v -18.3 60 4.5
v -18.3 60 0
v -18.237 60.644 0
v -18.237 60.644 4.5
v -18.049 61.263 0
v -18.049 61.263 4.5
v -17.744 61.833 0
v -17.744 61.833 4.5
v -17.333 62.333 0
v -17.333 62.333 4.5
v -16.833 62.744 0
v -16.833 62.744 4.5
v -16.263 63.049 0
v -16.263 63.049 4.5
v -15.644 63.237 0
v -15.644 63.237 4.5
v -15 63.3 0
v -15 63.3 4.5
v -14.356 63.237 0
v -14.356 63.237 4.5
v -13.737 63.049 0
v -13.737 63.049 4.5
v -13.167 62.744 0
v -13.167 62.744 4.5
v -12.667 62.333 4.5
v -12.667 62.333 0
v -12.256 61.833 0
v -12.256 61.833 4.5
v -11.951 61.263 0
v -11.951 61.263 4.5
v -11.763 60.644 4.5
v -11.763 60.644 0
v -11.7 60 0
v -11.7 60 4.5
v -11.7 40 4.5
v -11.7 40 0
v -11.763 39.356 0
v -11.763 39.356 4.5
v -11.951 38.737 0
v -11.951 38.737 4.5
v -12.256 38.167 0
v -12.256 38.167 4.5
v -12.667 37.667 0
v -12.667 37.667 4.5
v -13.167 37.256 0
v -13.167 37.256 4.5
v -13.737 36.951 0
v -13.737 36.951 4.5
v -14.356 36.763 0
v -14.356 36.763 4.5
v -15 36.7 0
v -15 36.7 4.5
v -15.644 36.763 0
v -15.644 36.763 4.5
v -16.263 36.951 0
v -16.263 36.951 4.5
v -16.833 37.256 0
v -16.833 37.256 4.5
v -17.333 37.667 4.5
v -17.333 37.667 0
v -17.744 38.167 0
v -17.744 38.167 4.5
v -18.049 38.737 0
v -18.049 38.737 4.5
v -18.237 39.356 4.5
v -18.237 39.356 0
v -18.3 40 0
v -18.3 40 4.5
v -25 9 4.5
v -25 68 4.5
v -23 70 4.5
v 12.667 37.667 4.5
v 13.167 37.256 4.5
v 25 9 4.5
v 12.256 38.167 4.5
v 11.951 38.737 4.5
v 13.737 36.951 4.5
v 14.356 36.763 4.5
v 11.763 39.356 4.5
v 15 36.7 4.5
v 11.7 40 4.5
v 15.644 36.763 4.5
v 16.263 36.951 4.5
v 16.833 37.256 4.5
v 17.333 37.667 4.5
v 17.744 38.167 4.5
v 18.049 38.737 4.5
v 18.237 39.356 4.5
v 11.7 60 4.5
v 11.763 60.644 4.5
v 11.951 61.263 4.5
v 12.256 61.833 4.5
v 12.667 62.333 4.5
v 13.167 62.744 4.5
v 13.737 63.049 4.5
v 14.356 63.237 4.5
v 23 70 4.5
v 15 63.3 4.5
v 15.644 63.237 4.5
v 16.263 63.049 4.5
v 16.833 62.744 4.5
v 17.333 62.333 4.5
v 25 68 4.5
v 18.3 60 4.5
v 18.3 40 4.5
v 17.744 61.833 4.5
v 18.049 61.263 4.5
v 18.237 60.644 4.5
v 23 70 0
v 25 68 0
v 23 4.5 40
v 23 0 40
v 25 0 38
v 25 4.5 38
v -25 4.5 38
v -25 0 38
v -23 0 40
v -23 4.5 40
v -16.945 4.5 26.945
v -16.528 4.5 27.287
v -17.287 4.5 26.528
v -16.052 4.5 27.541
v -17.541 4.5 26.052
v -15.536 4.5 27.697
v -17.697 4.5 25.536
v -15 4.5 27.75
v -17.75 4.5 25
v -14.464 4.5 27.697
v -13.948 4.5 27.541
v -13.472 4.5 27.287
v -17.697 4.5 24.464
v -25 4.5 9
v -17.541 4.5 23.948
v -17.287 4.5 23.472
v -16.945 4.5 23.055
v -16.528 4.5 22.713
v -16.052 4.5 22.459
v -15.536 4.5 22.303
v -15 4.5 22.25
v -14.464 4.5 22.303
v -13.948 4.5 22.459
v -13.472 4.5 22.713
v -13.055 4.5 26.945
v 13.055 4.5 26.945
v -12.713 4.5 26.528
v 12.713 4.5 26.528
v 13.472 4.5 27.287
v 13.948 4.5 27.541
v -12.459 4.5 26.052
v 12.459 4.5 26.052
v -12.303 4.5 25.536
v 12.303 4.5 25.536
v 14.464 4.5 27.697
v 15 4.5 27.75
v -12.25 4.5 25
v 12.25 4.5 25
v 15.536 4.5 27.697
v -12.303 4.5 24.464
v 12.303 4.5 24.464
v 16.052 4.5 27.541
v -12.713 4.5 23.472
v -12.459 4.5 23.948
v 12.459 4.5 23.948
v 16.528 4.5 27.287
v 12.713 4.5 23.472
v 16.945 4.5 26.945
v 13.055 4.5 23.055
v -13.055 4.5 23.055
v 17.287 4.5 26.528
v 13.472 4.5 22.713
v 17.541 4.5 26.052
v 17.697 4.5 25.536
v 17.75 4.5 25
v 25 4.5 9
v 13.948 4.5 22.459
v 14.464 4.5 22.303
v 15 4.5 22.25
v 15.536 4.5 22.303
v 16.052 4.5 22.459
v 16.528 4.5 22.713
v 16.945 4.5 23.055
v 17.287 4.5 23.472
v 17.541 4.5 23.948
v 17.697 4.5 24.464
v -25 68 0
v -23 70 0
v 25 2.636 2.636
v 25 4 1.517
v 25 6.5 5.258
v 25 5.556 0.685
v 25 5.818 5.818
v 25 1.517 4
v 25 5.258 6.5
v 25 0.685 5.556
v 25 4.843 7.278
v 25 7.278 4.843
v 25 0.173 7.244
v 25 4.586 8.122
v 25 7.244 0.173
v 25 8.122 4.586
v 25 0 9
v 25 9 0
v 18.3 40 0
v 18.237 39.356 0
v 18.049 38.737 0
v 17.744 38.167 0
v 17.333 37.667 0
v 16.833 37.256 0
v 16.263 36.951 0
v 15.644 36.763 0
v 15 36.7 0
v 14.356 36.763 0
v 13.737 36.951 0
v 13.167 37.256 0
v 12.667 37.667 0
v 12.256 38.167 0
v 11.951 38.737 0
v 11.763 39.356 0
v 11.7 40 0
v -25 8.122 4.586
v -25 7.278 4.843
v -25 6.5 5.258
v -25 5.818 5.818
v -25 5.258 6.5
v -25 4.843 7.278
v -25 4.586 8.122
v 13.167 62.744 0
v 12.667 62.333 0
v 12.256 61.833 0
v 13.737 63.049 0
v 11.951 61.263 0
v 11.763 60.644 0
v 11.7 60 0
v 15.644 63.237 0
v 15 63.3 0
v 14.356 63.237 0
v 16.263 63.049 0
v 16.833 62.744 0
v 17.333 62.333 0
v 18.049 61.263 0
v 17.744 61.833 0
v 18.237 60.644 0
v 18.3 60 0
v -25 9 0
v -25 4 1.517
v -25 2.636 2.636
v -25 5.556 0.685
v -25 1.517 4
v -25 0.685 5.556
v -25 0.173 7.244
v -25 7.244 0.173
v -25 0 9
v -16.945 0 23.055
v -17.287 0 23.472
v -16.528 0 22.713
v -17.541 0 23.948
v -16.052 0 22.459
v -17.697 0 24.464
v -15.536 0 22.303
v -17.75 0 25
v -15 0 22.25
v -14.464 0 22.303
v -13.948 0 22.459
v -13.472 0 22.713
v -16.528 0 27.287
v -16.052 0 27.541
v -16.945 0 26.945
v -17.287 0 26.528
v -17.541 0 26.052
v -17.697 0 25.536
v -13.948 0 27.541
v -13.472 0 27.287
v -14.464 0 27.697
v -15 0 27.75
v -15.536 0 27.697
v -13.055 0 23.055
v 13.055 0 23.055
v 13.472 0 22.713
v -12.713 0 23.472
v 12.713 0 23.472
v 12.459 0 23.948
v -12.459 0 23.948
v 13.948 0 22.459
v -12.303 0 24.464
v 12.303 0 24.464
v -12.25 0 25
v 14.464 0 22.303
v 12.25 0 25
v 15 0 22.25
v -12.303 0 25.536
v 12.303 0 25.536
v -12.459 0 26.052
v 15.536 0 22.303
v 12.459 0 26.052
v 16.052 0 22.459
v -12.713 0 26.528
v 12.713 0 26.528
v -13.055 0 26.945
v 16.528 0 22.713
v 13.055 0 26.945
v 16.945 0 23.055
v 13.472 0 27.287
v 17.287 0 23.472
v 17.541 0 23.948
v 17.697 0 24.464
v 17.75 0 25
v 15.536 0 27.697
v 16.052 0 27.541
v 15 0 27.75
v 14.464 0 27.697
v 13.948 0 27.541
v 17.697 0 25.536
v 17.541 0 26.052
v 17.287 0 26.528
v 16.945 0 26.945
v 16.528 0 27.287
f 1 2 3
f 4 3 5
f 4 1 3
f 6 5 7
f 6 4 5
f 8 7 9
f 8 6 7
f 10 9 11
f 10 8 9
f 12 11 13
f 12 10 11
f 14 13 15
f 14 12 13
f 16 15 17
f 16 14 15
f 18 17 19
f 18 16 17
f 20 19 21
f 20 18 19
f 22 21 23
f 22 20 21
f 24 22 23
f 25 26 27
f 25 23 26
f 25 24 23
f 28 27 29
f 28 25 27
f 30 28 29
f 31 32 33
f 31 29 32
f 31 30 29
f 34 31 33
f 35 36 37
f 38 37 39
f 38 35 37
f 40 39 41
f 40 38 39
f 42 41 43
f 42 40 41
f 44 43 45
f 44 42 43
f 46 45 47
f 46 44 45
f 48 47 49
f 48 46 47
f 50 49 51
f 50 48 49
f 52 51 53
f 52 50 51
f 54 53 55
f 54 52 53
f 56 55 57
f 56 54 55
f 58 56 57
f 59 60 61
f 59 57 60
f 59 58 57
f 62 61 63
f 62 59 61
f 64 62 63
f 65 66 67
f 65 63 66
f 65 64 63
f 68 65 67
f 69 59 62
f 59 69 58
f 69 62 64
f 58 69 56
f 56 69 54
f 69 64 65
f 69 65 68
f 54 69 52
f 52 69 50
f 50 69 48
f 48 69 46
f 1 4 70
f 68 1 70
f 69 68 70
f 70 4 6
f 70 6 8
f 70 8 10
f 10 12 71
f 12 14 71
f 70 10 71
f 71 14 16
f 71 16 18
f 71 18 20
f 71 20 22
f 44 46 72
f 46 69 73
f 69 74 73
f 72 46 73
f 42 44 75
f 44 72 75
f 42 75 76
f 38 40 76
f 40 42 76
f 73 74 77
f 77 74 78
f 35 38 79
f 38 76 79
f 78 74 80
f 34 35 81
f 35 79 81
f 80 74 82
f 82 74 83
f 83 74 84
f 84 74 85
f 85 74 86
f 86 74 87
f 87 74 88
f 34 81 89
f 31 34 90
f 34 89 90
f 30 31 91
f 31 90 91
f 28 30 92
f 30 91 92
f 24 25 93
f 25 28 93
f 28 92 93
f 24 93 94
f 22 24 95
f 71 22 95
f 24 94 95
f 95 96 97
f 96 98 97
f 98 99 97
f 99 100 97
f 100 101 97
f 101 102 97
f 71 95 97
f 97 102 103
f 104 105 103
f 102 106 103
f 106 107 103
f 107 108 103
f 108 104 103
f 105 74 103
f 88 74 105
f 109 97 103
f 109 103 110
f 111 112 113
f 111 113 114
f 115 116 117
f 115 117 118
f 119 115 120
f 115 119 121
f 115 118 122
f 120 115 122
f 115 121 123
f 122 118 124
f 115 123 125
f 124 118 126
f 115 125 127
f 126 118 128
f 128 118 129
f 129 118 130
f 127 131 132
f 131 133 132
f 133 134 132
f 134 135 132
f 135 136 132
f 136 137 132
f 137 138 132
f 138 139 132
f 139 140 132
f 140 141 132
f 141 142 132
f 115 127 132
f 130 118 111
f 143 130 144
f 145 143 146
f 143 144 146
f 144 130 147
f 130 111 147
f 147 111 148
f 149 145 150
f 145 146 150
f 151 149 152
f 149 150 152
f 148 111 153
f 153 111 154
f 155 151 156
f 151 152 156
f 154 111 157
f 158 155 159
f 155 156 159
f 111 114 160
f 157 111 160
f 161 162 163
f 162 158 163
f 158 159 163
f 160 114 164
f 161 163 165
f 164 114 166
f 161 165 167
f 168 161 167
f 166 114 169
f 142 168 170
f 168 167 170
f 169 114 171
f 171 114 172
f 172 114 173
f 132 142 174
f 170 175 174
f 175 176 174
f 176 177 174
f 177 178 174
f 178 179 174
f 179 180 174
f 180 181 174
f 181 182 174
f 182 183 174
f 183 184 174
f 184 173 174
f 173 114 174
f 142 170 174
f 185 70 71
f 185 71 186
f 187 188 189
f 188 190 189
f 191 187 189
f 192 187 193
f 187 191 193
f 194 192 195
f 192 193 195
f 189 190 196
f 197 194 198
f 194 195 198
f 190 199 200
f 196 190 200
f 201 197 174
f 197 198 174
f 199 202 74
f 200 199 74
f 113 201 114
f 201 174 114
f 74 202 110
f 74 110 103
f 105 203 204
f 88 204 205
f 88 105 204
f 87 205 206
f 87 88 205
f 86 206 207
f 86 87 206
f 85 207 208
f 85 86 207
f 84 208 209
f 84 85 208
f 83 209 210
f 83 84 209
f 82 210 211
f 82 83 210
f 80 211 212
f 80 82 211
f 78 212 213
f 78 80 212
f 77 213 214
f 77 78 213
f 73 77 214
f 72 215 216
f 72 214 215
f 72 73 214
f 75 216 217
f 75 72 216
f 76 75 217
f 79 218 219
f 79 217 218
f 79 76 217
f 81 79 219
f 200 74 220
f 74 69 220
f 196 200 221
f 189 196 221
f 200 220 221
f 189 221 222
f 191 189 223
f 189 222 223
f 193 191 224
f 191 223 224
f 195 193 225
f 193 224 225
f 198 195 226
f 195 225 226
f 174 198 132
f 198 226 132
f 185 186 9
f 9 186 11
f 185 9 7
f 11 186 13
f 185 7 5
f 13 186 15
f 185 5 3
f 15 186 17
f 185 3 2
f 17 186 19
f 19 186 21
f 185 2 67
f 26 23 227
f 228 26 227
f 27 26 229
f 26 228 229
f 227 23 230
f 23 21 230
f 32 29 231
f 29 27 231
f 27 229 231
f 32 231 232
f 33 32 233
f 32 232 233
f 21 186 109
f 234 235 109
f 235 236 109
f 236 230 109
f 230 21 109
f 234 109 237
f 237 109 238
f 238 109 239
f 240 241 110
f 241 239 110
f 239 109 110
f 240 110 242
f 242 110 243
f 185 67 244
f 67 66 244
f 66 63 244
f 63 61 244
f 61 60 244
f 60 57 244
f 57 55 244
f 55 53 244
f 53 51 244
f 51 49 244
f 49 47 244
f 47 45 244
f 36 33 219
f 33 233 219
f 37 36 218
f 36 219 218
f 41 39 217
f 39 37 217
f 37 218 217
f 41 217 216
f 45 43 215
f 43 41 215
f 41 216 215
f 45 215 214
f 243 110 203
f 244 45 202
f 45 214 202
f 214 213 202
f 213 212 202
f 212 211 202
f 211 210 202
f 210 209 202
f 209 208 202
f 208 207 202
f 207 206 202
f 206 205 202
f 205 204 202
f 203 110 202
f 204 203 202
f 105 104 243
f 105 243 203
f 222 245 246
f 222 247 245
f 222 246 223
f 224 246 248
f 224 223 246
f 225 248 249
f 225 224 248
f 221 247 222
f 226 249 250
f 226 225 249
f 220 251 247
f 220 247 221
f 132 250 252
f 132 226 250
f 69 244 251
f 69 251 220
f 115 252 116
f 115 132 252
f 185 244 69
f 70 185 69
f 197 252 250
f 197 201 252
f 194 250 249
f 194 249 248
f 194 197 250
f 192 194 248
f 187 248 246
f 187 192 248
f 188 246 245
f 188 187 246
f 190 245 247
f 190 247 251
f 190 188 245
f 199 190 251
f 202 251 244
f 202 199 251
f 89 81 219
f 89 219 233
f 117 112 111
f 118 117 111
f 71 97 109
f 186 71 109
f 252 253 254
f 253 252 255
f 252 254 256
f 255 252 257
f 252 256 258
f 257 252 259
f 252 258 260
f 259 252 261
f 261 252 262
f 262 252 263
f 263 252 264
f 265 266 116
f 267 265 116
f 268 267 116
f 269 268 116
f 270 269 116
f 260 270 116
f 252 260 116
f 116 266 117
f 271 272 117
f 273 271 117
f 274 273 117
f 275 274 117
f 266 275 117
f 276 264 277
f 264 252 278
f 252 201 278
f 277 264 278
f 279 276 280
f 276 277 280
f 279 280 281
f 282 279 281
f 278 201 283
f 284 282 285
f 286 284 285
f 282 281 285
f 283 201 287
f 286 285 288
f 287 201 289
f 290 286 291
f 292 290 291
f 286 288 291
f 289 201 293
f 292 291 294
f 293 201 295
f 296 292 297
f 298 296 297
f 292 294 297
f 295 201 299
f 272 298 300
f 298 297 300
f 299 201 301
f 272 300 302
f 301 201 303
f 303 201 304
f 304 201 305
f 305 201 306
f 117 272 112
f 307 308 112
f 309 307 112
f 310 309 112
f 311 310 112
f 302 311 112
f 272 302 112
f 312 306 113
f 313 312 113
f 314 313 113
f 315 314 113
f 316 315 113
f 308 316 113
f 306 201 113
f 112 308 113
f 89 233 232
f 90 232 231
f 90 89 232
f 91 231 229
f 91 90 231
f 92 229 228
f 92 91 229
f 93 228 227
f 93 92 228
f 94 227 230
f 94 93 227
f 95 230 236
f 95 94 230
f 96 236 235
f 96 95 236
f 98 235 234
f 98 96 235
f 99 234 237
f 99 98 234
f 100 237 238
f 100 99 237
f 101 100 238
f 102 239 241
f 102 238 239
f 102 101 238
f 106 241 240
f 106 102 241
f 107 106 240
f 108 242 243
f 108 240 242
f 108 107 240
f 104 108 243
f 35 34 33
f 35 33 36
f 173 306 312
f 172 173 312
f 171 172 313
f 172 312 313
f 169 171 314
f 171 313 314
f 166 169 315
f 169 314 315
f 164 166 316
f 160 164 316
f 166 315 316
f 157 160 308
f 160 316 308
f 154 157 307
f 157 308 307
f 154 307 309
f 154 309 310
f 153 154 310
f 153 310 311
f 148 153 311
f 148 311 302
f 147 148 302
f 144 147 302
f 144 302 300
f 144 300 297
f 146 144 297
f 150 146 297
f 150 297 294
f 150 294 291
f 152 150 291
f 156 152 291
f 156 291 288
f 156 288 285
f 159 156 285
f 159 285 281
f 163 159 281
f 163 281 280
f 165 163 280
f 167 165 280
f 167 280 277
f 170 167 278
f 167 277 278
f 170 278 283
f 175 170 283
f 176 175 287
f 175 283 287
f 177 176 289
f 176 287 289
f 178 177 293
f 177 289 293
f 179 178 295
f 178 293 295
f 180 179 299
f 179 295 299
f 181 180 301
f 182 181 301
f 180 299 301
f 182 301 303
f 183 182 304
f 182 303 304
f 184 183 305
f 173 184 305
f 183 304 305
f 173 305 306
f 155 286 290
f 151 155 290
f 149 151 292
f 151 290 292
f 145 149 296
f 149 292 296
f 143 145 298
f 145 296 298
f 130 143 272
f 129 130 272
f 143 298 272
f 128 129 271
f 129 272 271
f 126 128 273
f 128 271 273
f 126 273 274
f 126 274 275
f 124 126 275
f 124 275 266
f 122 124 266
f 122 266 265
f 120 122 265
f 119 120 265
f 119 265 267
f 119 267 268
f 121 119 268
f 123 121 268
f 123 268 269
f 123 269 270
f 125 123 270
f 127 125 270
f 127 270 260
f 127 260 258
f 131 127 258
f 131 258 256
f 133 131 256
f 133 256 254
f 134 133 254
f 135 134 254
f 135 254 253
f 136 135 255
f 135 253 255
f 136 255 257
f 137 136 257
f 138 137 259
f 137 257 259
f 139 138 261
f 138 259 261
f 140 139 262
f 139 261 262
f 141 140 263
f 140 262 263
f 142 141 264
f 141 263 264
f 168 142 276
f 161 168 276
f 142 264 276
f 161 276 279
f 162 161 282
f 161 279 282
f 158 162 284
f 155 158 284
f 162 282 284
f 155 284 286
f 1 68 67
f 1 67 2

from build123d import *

# Parameters (mm, degrees)
BOSS_EXTRUDE1_DEPTH  = 25
FILLET1_R            = 4.5
FILLET2_R            = 9
M5_CLEARANCE_HOLE1_D = 5.5
CUT_EXTRUDE1_DEPTH   = 5.5
CHAMFER1_SIZE        = 2


with BuildPart() as part:
    # Sketch1 → Boss-Extrude1 (new body, symmetric)
    with BuildSketch(Plane(origin=(0, 0, 0), x_dir=(0, 0, -1), z_dir=(1, 0, 0))):
        Polygon((0, 0), (-40, 0), (-40, 4.5), (-4.5, 4.5), (-4.5, 70), (0, 70), align=None)
    extrude(amount=BOSS_EXTRUDE1_DEPTH, both=True)

    # Fillet1
    fillet1_edges = [part.edges().sort_by_distance(p)[0] for p in [
        (0, 4.5, 4.5),
    ]]
    fillet(fillet1_edges, radius=FILLET1_R)

    # Fillet2
    fillet2_edges = [part.edges().sort_by_distance(p)[0] for p in [
        (0, 0, 0),
    ]]
    fillet(fillet2_edges, radius=FILLET2_R)

    # M5 Clearance Hole1 (through all)
    with Locations(Plane(origin=(0, 4.5, 0), x_dir=(-1, 0, 0), z_dir=(0, 1, 0))):
        with Locations((15, 25), (-15, 25)):
            Hole(M5_CLEARANCE_HOLE1_D / 2)

    # Sketch4 → Cut-Extrude1 (cut, through all)
    with BuildSketch(Plane.XY.offset(4.5)):
        with BuildLine():
            Line((-11.7, 60), (-11.7, 40))
            ThreePointArc((-11.7, 40), (-15, 36.7), (-18.3, 40))
            Line((-18.3, 40), (-18.3, 60))
            ThreePointArc((-18.3, 60), (-15, 63.3), (-11.7, 60))
        make_face()
        with BuildLine():
            Line((18.3, 60), (18.3, 40))
            ThreePointArc((18.3, 40), (15, 36.7), (11.7, 40))
            Line((11.7, 40), (11.7, 60))
            ThreePointArc((11.7, 60), (15, 63.3), (18.3, 60))
        make_face()
    extrude(amount=-CUT_EXTRUDE1_DEPTH, mode=Mode.SUBTRACT)

    # Chamfer1
    chamfer1_edges = [part.edges().sort_by_distance(p)[0] for p in [
        (25, 2.25, 40),
        (25, 70, 2.25),
        (-25, 70, 2.25),
        (-25, 2.25, 40),
    ]]
    chamfer(chamfer1_edges, length=CHAMFER1_SIZE)


solid = part.part
